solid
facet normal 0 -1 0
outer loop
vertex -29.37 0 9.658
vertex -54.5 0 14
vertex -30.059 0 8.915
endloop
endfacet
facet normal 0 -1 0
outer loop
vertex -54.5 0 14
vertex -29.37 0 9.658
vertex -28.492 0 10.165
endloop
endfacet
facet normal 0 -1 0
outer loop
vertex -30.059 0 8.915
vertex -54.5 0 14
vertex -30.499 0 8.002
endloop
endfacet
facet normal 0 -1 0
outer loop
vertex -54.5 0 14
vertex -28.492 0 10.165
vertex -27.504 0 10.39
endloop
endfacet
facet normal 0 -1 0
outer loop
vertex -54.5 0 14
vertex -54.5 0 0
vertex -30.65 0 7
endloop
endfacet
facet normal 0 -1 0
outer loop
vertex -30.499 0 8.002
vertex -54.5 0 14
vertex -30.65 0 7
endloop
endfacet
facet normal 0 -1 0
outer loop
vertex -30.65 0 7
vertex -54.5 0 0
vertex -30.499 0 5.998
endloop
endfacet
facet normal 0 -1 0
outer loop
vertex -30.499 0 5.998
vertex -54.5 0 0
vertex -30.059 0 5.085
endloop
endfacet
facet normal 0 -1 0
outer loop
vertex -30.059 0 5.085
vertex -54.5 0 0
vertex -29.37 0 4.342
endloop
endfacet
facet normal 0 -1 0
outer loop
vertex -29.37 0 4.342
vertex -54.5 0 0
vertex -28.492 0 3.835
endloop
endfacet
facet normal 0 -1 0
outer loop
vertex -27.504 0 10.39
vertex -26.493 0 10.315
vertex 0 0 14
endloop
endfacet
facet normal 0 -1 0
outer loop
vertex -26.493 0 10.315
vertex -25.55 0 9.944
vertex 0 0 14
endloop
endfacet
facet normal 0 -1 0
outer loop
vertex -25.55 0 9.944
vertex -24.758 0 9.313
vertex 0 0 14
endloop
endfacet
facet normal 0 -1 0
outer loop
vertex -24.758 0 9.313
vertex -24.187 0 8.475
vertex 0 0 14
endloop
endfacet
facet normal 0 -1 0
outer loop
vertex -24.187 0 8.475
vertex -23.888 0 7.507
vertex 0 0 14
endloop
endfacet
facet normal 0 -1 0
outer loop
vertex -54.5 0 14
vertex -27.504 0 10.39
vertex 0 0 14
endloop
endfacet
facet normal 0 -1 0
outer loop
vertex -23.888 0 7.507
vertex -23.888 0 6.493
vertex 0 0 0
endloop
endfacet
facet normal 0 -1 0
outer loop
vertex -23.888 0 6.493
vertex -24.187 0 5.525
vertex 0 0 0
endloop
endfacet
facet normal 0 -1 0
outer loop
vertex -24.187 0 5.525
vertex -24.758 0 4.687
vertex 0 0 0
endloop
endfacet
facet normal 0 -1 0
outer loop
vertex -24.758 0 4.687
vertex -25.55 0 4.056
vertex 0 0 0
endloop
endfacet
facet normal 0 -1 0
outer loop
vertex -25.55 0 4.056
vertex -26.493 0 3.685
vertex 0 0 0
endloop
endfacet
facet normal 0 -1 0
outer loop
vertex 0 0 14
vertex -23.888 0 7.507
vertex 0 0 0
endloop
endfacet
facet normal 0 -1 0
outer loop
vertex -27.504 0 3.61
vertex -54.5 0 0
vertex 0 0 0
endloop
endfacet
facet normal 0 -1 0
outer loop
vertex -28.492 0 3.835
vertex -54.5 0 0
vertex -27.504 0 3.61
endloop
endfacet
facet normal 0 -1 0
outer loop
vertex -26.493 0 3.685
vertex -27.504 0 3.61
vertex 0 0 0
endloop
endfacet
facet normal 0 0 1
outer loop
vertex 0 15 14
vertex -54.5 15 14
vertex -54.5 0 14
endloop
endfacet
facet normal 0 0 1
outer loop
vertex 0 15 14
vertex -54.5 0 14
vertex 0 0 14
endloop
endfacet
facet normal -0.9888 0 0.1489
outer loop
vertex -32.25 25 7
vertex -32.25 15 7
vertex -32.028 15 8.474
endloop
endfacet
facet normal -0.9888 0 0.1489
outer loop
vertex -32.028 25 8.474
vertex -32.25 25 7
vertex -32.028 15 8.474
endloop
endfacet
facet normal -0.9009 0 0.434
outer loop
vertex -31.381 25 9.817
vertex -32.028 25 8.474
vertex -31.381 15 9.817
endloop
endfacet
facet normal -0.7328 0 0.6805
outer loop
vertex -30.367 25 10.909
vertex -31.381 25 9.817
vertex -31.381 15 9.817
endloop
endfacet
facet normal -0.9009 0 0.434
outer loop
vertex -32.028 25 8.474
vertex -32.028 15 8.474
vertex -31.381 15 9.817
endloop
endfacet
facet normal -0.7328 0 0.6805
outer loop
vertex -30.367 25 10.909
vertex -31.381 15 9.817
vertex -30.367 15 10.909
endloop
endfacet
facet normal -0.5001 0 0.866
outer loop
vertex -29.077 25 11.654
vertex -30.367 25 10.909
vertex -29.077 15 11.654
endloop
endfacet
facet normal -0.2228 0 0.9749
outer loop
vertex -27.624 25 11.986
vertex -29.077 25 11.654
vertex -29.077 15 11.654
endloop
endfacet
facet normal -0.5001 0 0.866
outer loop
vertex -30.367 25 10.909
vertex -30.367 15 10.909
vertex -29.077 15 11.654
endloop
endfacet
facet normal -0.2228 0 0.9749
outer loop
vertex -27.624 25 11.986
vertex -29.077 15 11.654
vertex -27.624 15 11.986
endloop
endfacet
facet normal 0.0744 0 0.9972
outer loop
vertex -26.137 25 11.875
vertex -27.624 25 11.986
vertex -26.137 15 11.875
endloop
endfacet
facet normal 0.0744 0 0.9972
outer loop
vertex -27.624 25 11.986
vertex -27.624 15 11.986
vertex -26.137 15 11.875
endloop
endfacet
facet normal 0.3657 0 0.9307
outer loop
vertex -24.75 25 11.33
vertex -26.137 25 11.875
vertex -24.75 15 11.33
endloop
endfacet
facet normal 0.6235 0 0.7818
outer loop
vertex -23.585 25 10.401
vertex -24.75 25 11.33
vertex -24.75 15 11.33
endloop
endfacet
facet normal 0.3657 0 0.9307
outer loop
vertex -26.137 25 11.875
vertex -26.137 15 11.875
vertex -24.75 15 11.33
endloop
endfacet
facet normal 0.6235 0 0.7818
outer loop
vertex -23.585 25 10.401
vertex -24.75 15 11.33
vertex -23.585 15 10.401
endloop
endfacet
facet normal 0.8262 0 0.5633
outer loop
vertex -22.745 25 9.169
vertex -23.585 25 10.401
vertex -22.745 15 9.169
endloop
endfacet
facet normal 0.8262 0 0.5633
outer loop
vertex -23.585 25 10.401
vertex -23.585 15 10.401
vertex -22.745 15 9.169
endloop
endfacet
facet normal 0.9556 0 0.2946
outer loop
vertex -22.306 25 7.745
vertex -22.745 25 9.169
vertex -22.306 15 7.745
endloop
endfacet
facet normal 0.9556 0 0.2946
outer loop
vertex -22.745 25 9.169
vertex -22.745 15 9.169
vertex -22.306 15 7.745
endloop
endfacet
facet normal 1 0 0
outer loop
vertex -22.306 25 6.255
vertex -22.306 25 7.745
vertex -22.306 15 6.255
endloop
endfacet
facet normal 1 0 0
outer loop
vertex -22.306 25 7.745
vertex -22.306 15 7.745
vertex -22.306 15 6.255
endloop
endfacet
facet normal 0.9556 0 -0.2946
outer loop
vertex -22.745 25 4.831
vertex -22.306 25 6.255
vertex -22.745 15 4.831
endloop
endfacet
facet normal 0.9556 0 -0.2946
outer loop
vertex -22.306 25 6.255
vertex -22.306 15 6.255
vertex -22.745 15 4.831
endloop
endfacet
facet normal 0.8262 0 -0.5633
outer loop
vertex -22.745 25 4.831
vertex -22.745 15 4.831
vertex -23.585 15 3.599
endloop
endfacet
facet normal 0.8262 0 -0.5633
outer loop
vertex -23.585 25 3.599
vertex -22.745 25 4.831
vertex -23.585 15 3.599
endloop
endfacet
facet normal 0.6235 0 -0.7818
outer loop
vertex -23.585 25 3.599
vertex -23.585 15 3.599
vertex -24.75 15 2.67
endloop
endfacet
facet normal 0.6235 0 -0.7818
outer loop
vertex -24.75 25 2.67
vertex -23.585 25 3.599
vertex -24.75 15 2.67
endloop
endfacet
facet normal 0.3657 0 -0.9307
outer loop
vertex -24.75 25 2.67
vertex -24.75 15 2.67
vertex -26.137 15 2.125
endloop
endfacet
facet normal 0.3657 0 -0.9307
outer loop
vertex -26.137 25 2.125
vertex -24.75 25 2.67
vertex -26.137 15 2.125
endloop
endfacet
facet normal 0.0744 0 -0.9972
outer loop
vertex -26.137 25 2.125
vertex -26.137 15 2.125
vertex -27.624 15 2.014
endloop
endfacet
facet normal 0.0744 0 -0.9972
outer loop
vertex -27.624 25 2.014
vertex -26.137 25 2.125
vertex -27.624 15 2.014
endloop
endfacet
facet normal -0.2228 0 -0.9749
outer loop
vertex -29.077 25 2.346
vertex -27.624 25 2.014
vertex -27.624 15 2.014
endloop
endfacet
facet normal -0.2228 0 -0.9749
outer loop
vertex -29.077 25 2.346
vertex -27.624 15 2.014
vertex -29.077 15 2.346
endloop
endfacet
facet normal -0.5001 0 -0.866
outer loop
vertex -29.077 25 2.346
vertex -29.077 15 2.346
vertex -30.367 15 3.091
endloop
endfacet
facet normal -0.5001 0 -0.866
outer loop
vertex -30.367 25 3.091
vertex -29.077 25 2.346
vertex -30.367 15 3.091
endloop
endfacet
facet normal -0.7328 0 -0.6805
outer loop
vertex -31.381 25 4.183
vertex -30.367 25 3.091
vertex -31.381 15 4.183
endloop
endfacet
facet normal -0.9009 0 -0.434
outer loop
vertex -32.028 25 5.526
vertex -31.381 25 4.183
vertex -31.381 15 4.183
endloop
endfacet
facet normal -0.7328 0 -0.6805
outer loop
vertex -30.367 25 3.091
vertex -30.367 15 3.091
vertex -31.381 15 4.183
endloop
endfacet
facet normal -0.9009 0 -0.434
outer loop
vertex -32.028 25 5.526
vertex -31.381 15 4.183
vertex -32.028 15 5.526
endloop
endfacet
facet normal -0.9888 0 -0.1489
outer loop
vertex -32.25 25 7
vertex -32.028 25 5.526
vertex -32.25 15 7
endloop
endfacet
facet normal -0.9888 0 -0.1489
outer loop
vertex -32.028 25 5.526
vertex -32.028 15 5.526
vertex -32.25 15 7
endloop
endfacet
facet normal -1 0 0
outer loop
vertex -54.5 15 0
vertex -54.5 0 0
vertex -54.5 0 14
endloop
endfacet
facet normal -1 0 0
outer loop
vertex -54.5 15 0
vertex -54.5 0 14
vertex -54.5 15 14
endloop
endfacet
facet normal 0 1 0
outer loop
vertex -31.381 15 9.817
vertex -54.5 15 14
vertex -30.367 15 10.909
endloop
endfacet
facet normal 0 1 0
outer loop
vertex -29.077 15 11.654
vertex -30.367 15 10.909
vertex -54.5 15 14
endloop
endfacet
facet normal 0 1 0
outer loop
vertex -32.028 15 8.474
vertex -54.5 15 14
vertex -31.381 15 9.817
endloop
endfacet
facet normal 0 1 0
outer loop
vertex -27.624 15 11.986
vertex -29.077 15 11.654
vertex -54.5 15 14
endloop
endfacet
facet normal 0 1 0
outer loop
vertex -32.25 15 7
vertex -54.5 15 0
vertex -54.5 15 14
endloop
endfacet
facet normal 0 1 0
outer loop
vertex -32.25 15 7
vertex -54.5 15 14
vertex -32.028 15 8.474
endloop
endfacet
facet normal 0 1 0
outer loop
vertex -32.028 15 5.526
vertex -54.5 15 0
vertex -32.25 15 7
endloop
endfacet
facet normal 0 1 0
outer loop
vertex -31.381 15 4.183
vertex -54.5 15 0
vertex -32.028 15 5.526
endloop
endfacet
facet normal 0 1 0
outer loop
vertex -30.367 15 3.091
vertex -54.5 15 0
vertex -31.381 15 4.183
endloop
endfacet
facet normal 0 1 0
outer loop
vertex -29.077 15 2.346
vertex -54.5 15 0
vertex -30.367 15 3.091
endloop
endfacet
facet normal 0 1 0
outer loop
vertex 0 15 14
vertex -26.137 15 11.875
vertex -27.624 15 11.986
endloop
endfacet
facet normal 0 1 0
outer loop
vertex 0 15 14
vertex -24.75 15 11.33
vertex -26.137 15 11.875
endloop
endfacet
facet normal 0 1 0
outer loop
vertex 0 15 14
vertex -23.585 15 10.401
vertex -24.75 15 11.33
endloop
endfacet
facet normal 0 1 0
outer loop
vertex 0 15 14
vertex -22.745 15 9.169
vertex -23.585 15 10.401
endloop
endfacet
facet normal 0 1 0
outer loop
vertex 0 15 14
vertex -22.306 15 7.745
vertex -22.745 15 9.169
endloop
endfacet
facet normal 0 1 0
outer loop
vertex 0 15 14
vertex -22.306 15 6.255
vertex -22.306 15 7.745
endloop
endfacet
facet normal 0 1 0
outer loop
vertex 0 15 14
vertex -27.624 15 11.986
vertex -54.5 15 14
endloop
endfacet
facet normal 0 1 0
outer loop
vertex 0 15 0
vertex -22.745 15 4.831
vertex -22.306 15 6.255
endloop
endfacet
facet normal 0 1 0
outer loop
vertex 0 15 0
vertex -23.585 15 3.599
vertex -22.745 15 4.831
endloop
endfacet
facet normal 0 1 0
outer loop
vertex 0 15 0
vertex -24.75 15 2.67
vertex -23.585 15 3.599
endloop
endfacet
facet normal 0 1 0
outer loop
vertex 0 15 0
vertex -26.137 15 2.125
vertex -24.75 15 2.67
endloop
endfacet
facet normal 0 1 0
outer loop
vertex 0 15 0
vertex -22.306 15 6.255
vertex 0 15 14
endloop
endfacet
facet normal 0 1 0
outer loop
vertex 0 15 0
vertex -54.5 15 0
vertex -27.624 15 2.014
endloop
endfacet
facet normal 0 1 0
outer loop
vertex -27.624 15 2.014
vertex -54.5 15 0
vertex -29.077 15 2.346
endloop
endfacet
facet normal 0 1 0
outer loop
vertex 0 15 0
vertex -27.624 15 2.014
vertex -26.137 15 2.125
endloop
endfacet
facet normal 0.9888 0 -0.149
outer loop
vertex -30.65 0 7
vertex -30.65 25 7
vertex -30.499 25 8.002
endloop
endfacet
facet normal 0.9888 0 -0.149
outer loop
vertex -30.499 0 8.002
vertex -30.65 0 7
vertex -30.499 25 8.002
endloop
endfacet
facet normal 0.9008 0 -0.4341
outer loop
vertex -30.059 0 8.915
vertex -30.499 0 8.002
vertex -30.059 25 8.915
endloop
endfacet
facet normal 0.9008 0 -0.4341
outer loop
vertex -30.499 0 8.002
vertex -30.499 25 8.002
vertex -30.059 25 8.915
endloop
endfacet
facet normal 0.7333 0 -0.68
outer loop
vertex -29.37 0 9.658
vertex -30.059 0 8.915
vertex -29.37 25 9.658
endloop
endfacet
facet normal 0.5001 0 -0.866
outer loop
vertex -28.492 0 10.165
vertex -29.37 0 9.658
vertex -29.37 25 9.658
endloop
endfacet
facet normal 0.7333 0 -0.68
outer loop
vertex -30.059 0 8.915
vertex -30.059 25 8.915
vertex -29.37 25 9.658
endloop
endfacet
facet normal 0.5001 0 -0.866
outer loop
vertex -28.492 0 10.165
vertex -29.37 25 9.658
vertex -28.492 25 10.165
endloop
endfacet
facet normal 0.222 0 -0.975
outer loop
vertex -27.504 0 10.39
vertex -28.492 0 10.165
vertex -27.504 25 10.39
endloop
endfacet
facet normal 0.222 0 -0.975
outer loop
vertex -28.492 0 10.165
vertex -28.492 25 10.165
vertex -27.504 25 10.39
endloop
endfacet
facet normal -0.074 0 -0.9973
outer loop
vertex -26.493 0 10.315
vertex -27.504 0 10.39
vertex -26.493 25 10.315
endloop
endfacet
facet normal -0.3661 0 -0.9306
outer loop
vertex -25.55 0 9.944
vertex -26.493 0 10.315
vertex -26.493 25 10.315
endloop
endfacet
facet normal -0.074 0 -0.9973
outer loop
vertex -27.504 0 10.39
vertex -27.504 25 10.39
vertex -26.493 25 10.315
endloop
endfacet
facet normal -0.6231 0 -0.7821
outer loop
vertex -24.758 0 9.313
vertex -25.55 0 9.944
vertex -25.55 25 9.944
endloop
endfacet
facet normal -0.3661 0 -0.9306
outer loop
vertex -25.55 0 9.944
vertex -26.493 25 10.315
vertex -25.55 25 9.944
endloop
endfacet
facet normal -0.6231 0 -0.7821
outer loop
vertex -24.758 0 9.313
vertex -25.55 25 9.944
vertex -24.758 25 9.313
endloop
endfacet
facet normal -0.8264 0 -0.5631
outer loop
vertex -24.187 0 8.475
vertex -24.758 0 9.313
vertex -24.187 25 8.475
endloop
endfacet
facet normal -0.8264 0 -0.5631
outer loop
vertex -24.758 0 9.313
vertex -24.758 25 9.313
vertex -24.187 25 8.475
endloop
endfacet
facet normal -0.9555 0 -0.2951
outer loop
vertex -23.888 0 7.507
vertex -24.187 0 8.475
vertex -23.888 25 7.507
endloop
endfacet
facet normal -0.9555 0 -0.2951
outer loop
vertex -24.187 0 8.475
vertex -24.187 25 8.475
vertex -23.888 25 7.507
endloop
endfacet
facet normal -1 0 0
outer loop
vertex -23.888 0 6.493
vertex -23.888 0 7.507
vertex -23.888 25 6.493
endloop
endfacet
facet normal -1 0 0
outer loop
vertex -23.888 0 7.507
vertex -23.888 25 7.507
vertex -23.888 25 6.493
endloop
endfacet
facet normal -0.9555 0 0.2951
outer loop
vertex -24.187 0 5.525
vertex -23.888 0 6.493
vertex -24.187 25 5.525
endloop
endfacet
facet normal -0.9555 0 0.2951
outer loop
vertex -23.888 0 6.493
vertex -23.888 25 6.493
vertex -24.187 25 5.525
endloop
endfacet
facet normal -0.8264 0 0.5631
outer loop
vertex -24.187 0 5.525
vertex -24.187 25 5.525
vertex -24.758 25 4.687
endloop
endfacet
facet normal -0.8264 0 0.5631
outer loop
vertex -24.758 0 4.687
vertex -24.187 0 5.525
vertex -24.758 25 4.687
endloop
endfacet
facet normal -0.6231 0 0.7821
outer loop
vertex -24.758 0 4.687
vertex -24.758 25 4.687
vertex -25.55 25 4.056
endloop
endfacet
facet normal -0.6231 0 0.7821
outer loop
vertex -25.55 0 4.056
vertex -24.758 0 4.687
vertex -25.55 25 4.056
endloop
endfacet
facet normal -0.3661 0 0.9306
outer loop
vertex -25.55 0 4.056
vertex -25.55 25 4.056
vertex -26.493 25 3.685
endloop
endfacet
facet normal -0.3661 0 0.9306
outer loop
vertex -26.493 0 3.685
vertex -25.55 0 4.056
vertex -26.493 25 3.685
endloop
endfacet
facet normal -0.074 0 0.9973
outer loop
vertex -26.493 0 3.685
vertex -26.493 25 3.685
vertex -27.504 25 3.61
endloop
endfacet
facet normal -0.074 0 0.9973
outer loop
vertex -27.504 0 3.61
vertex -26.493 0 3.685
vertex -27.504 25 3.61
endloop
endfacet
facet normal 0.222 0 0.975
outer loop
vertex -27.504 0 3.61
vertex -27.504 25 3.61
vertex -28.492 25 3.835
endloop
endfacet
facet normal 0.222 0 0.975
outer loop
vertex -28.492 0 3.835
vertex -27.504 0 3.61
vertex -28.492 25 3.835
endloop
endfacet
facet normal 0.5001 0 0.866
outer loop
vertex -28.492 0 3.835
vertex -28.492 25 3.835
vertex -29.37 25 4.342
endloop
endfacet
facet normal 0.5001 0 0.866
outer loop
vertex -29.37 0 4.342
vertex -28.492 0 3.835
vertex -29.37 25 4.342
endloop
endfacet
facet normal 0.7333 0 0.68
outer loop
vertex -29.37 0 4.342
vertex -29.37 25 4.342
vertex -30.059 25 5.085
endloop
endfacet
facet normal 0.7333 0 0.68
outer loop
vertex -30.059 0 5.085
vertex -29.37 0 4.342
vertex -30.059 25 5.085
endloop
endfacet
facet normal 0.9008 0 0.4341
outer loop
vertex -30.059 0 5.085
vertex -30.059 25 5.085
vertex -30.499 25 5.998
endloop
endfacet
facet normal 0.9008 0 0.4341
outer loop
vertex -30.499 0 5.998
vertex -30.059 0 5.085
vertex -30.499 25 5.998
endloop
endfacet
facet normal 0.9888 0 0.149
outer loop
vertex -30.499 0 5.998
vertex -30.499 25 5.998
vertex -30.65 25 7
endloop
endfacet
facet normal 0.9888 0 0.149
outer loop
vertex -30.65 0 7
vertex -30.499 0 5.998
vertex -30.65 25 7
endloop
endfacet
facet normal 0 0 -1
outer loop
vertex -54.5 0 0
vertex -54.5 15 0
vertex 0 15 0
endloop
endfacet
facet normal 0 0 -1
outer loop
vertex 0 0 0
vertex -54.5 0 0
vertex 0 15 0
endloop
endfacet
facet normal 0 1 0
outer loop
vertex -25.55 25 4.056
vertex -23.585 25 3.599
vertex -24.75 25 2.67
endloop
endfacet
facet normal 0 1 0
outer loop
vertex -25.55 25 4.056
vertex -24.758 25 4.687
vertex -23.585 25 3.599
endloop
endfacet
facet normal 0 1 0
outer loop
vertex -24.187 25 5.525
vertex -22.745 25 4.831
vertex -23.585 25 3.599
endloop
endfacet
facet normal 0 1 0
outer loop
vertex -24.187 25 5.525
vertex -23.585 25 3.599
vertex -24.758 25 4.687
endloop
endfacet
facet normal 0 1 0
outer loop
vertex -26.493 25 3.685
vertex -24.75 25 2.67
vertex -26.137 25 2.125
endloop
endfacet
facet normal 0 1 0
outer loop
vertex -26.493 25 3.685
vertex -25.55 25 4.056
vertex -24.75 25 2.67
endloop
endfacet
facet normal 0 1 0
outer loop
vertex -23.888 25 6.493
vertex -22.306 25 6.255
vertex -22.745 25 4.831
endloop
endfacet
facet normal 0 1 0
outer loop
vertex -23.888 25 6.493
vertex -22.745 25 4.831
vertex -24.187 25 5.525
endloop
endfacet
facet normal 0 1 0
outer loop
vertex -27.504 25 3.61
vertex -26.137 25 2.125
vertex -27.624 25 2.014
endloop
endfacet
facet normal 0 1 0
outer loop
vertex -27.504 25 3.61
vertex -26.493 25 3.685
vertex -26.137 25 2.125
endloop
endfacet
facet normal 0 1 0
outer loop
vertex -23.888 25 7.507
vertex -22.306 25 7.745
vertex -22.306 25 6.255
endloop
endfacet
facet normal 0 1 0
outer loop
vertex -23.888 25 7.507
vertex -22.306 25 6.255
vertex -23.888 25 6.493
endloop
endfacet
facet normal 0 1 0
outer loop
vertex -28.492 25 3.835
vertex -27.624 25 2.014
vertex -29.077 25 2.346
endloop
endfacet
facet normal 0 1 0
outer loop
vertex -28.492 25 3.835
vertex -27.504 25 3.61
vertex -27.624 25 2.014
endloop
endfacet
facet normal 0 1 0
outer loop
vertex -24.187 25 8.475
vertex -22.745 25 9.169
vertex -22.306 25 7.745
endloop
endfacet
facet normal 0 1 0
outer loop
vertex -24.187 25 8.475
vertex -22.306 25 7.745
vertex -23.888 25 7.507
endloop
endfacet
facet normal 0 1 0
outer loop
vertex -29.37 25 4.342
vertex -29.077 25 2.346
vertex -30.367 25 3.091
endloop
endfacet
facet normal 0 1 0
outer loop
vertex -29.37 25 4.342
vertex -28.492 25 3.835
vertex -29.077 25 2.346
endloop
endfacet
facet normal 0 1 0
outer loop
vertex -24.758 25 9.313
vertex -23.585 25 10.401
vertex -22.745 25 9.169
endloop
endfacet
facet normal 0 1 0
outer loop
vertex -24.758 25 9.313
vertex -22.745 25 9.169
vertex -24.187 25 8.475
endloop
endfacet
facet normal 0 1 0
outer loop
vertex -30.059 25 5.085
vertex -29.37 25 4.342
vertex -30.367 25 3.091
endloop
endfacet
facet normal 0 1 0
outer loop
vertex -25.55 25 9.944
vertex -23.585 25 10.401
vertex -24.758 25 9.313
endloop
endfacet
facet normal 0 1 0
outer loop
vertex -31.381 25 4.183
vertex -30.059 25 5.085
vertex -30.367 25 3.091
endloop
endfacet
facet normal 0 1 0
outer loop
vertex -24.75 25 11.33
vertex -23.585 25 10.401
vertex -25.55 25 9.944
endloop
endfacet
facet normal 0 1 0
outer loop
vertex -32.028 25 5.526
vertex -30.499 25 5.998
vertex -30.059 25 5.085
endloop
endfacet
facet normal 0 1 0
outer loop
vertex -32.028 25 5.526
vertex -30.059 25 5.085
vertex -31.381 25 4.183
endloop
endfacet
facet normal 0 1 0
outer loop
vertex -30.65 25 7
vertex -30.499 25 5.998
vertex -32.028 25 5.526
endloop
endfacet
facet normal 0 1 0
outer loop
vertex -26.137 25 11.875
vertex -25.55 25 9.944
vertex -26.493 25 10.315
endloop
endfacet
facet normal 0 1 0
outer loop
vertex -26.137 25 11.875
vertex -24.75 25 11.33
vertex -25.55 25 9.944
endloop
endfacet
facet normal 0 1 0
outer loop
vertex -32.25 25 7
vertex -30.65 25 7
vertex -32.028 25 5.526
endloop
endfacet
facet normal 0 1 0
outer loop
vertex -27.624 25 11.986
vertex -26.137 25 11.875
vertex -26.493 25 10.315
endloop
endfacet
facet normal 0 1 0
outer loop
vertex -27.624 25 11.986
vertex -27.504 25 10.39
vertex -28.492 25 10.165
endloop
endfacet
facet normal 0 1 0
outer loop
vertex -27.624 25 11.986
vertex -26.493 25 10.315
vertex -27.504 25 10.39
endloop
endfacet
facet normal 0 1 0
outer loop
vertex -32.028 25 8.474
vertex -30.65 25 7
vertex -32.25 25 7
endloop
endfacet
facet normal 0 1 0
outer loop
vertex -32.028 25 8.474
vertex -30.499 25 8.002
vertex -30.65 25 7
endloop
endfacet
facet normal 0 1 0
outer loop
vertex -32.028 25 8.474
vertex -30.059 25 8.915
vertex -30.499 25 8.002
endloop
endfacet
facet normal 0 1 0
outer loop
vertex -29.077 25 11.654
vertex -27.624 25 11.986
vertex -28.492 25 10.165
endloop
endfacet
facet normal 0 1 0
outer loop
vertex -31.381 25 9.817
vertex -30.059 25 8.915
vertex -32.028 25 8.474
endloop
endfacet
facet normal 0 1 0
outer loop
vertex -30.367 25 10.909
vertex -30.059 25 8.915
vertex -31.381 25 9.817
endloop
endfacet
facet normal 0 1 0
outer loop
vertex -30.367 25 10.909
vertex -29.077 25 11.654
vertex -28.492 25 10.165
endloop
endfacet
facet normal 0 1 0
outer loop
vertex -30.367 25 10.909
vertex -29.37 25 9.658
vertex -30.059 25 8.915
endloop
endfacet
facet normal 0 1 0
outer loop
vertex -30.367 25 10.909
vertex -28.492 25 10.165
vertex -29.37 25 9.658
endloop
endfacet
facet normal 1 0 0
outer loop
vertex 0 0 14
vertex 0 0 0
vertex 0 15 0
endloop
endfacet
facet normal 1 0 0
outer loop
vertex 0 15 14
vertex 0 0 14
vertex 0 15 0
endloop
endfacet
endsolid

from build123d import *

# Parameters (mm, degrees)
SKETCH009_W     = 54.5
SKETCH009_H     = 15
PAD003_DEPTH    = 14
SKETCH011_R     = 5
PAD005_DEPTH    = 10
SKETCH012_R     = 3.4
POCKET004_DEPTH = 30


with BuildPart() as part:
    # Sketch009 → Pad003 (new body)
    with BuildSketch(Plane.XY):
        with Locations((-27.25, 7.5)):
            Rectangle(SKETCH009_W, SKETCH009_H)
    extrude(amount=PAD003_DEPTH)

    # Sketch011 (on Face3 of Pad003) → Pad005 (join)
    with BuildSketch(Plane(origin=(0, 15, 0), x_dir=(-1, 0, 0), z_dir=(0, 1, 0))):
        with Locations((27.25, 7)):
            Circle(SKETCH011_R)
    extrude(amount=PAD005_DEPTH)

    # Sketch012 (on Face8 of Pad005) → Pocket004 (cut)
    with BuildSketch(Plane(origin=(0, 25, 0), x_dir=(-1, 0, 0), z_dir=(0, 1, 0))):
        with Locations((27.25, 7)):
            Circle(SKETCH012_R)
    extrude(amount=-POCKET004_DEPTH, mode=Mode.SUBTRACT)


solid = part.part
